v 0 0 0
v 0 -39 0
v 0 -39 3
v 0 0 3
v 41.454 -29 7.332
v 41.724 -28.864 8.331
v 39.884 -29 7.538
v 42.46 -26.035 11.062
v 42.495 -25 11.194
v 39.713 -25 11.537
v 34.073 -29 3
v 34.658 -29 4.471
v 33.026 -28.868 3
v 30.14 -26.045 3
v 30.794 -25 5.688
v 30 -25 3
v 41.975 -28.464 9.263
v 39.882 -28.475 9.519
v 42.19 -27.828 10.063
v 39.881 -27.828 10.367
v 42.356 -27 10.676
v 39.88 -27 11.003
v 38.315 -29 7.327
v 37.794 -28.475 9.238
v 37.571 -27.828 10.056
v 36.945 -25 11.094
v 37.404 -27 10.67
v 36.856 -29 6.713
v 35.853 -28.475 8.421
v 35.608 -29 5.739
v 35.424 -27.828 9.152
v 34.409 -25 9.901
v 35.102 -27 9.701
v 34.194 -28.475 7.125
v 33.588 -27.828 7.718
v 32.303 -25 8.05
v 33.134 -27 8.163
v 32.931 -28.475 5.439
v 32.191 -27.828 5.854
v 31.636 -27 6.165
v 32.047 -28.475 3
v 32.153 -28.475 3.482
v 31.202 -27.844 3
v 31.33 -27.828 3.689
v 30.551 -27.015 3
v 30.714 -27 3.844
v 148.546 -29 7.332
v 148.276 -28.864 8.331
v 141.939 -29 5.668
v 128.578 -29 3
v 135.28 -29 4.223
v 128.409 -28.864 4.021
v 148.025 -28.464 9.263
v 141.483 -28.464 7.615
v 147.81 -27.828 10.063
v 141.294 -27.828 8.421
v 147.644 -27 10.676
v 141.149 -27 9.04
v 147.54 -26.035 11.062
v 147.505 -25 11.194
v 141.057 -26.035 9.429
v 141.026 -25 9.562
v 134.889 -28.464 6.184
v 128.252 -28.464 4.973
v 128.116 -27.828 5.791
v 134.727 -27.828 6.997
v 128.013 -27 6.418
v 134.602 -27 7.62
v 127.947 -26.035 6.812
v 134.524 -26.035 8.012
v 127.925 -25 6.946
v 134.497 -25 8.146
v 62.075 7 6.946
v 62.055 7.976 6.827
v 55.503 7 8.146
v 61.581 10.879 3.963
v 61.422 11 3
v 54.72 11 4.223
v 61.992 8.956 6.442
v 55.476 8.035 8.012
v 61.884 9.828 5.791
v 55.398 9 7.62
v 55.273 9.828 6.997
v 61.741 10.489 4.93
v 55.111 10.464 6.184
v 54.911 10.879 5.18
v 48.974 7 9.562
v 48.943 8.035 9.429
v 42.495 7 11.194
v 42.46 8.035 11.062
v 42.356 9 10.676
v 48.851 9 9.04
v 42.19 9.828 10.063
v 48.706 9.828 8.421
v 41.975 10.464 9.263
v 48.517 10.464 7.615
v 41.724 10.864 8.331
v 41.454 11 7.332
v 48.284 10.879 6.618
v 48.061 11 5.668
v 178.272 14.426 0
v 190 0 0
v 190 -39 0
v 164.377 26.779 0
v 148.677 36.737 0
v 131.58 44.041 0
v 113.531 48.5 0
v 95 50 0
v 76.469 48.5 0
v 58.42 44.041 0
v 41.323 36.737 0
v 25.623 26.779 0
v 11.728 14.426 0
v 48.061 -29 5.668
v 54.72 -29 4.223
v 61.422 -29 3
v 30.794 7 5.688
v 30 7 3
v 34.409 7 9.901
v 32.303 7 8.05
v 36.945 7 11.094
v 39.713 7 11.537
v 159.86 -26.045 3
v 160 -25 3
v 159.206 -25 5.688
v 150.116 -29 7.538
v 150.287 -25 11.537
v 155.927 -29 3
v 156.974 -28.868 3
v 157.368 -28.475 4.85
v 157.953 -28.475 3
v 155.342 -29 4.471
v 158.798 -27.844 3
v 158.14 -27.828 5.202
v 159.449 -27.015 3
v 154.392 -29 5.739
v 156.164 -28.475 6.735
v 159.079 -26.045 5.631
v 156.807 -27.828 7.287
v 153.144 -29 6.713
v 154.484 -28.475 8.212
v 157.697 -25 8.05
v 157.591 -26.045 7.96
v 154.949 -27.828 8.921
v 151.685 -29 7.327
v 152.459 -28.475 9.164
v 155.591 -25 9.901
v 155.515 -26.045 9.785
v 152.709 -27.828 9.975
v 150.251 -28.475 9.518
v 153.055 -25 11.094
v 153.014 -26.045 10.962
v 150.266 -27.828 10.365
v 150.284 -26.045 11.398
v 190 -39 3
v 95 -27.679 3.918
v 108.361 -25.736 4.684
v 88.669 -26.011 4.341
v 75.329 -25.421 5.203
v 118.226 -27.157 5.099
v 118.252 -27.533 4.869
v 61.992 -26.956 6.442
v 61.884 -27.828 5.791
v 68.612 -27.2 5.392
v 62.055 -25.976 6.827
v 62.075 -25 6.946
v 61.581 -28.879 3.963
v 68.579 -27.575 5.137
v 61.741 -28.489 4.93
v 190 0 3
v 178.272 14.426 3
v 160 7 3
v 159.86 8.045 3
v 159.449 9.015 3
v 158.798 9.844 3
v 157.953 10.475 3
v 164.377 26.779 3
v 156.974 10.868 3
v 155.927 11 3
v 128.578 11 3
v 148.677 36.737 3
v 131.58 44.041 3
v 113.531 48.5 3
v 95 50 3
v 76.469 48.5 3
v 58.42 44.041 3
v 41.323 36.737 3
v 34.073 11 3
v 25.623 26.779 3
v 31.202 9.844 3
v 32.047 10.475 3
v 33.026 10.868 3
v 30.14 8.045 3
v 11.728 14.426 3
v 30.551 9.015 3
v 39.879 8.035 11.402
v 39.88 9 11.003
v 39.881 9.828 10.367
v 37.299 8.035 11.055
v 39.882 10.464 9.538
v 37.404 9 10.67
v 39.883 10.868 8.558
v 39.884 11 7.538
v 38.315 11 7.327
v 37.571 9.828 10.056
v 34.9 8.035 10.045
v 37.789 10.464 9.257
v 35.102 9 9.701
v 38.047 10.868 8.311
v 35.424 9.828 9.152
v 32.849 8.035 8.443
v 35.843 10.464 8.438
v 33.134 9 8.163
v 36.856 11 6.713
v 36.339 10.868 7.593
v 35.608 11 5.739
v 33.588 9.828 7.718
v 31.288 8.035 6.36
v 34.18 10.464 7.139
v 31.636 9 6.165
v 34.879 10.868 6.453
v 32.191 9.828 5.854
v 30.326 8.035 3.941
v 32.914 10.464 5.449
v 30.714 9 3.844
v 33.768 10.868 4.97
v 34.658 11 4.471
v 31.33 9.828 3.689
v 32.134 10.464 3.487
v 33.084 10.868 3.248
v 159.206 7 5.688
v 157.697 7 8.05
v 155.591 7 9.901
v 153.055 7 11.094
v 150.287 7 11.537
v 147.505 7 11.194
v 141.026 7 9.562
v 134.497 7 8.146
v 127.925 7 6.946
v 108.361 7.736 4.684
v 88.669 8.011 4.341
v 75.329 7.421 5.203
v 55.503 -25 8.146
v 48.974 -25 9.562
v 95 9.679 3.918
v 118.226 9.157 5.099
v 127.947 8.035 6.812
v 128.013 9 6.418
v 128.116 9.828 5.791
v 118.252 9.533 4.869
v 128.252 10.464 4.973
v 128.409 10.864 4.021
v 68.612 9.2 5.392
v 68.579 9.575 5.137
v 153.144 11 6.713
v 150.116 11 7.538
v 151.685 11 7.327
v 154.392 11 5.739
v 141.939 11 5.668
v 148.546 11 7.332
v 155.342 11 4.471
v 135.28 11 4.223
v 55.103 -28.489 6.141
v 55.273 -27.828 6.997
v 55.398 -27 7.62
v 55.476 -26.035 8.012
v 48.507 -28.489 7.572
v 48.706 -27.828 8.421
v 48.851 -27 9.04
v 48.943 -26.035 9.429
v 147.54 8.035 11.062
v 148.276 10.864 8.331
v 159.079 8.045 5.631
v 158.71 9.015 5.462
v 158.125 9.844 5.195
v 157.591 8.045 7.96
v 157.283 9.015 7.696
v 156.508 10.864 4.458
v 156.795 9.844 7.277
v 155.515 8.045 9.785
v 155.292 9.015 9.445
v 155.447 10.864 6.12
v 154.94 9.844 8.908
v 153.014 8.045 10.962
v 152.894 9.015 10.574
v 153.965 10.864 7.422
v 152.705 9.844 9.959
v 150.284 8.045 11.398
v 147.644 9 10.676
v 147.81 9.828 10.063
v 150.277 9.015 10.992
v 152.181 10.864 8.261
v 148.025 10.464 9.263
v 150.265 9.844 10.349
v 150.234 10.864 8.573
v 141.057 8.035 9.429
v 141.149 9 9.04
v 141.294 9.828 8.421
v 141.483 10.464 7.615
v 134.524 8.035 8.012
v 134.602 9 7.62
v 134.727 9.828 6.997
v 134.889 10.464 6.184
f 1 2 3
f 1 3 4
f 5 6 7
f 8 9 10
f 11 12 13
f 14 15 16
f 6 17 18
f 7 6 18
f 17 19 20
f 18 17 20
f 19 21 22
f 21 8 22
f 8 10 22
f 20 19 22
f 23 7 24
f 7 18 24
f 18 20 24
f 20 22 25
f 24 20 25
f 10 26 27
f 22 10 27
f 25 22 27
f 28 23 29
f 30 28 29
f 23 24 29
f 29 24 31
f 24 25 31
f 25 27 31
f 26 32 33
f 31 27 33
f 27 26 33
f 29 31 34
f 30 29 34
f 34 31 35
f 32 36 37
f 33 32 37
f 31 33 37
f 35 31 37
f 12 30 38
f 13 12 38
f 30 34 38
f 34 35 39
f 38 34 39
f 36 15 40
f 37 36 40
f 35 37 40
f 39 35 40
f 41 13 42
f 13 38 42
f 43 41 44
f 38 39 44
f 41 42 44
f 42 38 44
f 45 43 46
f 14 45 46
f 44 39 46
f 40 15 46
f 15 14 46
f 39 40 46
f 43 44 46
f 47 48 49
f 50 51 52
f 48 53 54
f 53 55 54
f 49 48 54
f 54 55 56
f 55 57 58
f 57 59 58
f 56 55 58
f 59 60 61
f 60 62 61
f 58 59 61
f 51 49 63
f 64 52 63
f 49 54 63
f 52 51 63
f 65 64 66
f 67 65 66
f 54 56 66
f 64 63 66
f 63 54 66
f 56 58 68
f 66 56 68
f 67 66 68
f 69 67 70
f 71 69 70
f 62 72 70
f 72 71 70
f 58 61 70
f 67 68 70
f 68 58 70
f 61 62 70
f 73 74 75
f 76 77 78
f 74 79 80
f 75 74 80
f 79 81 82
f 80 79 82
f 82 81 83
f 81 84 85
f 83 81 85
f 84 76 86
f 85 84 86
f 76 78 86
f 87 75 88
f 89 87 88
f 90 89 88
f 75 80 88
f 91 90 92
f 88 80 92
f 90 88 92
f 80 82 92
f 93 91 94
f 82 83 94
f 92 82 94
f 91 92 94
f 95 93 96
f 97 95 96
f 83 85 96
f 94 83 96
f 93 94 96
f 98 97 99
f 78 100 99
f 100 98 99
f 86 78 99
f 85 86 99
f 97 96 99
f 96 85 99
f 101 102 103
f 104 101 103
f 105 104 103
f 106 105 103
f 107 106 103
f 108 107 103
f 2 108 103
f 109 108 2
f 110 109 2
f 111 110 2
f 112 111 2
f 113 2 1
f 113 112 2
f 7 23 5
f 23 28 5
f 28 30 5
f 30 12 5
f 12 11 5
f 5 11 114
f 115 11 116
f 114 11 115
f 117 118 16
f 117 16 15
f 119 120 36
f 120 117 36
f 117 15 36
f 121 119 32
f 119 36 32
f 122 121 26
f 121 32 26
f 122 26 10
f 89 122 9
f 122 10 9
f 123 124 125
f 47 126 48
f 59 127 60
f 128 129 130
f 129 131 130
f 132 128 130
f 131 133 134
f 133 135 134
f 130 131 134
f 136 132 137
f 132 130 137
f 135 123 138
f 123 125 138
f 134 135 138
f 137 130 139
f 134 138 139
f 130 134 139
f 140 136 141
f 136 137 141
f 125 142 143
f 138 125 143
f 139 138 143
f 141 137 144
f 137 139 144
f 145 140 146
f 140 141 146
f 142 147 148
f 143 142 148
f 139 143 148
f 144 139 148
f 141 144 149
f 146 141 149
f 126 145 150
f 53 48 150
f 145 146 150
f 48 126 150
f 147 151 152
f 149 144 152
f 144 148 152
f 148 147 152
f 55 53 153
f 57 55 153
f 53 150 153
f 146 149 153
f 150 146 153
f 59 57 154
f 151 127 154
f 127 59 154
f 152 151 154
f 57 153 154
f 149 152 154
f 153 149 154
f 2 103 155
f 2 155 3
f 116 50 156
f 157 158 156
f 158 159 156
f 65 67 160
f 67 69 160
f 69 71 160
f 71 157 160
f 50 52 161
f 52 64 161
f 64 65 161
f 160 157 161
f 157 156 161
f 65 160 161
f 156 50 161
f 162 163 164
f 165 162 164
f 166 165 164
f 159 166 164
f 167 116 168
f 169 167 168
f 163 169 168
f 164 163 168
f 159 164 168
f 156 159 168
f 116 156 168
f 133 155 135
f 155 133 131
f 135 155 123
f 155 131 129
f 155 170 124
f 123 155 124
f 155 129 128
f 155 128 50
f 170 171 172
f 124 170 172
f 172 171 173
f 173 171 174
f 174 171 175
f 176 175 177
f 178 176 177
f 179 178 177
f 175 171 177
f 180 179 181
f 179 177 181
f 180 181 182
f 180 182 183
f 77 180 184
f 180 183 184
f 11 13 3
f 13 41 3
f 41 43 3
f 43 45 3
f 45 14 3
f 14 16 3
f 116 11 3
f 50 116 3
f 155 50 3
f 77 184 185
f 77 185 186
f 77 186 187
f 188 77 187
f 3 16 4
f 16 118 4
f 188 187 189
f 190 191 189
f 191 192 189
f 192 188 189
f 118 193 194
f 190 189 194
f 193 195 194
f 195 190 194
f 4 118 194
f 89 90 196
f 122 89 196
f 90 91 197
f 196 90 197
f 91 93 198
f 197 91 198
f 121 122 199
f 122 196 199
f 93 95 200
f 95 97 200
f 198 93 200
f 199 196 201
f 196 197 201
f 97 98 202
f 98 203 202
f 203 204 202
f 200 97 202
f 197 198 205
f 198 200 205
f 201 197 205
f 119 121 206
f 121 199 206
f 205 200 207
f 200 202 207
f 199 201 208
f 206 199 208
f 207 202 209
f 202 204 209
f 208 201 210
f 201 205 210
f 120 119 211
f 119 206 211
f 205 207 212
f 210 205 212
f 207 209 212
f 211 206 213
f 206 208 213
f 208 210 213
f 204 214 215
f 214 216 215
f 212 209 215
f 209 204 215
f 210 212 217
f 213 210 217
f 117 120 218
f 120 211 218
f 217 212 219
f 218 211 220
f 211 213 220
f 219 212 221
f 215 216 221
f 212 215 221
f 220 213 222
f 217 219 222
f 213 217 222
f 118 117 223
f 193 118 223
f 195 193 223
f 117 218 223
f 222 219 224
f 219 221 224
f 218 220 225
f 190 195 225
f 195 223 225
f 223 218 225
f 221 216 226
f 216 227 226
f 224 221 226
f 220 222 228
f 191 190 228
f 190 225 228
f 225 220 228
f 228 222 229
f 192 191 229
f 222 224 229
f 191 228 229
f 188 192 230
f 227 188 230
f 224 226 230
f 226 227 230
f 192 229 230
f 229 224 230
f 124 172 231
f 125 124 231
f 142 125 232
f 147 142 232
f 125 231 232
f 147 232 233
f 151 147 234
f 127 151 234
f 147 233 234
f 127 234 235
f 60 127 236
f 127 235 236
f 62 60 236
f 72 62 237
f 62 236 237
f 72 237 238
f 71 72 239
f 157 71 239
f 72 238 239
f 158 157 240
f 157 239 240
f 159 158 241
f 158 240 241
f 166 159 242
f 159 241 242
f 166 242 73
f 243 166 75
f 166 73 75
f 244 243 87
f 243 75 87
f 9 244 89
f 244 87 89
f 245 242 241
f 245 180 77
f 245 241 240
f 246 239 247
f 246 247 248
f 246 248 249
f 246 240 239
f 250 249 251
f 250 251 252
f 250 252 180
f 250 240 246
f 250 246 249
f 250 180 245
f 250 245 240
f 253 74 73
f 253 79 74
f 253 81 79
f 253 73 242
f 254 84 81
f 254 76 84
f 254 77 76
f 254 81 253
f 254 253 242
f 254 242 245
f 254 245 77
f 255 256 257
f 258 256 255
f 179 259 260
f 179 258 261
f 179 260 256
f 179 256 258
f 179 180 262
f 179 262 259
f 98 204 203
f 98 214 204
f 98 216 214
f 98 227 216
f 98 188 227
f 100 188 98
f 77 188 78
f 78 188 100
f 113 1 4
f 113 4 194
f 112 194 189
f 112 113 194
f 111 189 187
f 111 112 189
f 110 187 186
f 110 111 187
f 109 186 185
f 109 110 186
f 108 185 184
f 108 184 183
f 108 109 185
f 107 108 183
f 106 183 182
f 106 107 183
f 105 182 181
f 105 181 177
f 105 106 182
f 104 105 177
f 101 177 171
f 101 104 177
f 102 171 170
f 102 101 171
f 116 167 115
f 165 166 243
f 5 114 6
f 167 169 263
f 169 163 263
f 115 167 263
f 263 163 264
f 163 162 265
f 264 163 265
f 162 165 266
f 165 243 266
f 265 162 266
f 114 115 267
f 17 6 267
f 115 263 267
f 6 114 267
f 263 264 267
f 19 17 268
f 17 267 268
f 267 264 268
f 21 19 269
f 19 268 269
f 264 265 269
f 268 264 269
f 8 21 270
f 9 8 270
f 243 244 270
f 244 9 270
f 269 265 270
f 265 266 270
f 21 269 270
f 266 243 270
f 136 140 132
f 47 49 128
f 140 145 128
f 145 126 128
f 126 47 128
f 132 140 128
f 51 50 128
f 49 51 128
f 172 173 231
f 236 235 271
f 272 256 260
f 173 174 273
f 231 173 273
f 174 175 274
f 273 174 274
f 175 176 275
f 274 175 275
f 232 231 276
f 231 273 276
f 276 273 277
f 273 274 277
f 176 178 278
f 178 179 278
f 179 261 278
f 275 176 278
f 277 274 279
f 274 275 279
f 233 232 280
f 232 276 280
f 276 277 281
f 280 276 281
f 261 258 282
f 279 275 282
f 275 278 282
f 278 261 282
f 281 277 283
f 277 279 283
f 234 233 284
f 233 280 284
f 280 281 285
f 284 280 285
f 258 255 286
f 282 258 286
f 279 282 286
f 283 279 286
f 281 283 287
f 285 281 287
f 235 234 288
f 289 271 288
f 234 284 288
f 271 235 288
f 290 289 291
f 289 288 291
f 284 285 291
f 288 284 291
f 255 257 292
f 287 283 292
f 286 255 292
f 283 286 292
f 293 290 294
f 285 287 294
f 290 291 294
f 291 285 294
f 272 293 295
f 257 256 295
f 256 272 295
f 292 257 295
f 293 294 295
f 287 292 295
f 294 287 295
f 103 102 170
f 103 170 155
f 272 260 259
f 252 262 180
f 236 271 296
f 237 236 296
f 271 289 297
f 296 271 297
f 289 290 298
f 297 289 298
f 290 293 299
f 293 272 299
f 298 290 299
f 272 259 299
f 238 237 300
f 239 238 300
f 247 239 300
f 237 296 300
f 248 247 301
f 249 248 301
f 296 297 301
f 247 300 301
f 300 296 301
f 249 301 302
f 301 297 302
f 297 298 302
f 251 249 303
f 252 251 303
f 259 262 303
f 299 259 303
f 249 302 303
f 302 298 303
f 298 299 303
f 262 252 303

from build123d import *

# Parameters (mm, degrees)
BOSS_EXTRUDE1_DEPTH = 3
SKETCH2_W           = 130
SKETCH2_H           = 40
BOSS_EXTRUDE2_DEPTH = 12
CUT_EXTRUDE1_REACH  = 199.041
FILLET1_R           = 10
FILLET2_R           = 4


with BuildPart() as part:
    # Sketch1 → Boss-Extrude1 (new body)
    with BuildSketch(Plane.XY):
        with BuildLine():
            Line((190, 0), (190, -39))
            Line((190, -39), (0, -39))
            Line((0, -39), (0, 0))
            ThreePointArc((0, 0), (95, 50), (190, 0))
        make_face()
    extrude(amount=BOSS_EXTRUDE1_DEPTH)

    # Sketch2 → Boss-Extrude2 (add)
    with BuildSketch(Plane.XY.offset(3)):
        with Locations((95, -9)):
            Rectangle(SKETCH2_W, SKETCH2_H)
    extrude(amount=BOSS_EXTRUDE2_DEPTH)

    # Sketch3 → Cut-Extrude1 (cut, up to next)
    with BuildSketch(Plane(origin=(0, 11, 0), x_dir=(1, 0, 0), z_dir=(0, 1, 0)), mode=Mode.PRIVATE) as cut_extrude1_sk1:
        with BuildLine():
            Line((30, -15), (160, -15))
            ThreePointArc((160, -15), (95, -4.241357564), (30, -15))
        make_face()
    cut_extrude1_tool1 = extrude(cut_extrude1_sk1.sketch, amount=-CUT_EXTRUDE1_REACH, mode=Mode.PRIVATE) & part.part
    add(cut_extrude1_tool1.solids().sort_by_distance((95, 11, 10.686553))[0], mode=Mode.SUBTRACT)

    # Fillet1
    # the kernel refuses this fillet: 10 mm, written as the material it takes off along each edge
    with BuildSketch(Plane(origin=(160, 43.655354589, 15), x_dir=(0, 0, -1), z_dir=(0, -1, 0)), Plane(origin=(30, -61.655354589, 15), x_dir=(0, 0, -1), z_dir=(0, 1, 0))) as fillet1_piece_1:
        with BuildLine():
            CenterArc((13.461551545, -9.892616796), FILLET1_R, 98.40417735, 96.681797386)
            Line((3.806187845, -12.495298453), (3.613080571, -12.547352086))
            ThreePointArc((3.613080571, -12.547352086), (1.812932851, -6.275113154), (-0.189333785, -0.064441584))
            Line((-0.189333785, -0.064441584), (0, 0.2))
            ThreePointArc((0, 0.2), (6, 0.2), (11.970768969, 0.197852336))
            Line((11.970768969, 0.197852336), (12, 0))
        make_face()
    extrude(amount=105.310709179, mode=Mode.SUBTRACT)

    # Fillet2
    fillet2_edges = [part.edges().sort_by_distance(p)[0] for p in [
        (95, -29, 4.241357564),
        (95, 11, 4.241357564),
        (34.408965823, 11, 9.900838783),
        (155.591034177, 11, 9.900838783),
        (34.408965823, -29, 9.900838783),
        (155.591034177, -29, 9.900838783),
    ]]
    fillet(fillet2_edges, radius=FILLET2_R)


solid = part.part
